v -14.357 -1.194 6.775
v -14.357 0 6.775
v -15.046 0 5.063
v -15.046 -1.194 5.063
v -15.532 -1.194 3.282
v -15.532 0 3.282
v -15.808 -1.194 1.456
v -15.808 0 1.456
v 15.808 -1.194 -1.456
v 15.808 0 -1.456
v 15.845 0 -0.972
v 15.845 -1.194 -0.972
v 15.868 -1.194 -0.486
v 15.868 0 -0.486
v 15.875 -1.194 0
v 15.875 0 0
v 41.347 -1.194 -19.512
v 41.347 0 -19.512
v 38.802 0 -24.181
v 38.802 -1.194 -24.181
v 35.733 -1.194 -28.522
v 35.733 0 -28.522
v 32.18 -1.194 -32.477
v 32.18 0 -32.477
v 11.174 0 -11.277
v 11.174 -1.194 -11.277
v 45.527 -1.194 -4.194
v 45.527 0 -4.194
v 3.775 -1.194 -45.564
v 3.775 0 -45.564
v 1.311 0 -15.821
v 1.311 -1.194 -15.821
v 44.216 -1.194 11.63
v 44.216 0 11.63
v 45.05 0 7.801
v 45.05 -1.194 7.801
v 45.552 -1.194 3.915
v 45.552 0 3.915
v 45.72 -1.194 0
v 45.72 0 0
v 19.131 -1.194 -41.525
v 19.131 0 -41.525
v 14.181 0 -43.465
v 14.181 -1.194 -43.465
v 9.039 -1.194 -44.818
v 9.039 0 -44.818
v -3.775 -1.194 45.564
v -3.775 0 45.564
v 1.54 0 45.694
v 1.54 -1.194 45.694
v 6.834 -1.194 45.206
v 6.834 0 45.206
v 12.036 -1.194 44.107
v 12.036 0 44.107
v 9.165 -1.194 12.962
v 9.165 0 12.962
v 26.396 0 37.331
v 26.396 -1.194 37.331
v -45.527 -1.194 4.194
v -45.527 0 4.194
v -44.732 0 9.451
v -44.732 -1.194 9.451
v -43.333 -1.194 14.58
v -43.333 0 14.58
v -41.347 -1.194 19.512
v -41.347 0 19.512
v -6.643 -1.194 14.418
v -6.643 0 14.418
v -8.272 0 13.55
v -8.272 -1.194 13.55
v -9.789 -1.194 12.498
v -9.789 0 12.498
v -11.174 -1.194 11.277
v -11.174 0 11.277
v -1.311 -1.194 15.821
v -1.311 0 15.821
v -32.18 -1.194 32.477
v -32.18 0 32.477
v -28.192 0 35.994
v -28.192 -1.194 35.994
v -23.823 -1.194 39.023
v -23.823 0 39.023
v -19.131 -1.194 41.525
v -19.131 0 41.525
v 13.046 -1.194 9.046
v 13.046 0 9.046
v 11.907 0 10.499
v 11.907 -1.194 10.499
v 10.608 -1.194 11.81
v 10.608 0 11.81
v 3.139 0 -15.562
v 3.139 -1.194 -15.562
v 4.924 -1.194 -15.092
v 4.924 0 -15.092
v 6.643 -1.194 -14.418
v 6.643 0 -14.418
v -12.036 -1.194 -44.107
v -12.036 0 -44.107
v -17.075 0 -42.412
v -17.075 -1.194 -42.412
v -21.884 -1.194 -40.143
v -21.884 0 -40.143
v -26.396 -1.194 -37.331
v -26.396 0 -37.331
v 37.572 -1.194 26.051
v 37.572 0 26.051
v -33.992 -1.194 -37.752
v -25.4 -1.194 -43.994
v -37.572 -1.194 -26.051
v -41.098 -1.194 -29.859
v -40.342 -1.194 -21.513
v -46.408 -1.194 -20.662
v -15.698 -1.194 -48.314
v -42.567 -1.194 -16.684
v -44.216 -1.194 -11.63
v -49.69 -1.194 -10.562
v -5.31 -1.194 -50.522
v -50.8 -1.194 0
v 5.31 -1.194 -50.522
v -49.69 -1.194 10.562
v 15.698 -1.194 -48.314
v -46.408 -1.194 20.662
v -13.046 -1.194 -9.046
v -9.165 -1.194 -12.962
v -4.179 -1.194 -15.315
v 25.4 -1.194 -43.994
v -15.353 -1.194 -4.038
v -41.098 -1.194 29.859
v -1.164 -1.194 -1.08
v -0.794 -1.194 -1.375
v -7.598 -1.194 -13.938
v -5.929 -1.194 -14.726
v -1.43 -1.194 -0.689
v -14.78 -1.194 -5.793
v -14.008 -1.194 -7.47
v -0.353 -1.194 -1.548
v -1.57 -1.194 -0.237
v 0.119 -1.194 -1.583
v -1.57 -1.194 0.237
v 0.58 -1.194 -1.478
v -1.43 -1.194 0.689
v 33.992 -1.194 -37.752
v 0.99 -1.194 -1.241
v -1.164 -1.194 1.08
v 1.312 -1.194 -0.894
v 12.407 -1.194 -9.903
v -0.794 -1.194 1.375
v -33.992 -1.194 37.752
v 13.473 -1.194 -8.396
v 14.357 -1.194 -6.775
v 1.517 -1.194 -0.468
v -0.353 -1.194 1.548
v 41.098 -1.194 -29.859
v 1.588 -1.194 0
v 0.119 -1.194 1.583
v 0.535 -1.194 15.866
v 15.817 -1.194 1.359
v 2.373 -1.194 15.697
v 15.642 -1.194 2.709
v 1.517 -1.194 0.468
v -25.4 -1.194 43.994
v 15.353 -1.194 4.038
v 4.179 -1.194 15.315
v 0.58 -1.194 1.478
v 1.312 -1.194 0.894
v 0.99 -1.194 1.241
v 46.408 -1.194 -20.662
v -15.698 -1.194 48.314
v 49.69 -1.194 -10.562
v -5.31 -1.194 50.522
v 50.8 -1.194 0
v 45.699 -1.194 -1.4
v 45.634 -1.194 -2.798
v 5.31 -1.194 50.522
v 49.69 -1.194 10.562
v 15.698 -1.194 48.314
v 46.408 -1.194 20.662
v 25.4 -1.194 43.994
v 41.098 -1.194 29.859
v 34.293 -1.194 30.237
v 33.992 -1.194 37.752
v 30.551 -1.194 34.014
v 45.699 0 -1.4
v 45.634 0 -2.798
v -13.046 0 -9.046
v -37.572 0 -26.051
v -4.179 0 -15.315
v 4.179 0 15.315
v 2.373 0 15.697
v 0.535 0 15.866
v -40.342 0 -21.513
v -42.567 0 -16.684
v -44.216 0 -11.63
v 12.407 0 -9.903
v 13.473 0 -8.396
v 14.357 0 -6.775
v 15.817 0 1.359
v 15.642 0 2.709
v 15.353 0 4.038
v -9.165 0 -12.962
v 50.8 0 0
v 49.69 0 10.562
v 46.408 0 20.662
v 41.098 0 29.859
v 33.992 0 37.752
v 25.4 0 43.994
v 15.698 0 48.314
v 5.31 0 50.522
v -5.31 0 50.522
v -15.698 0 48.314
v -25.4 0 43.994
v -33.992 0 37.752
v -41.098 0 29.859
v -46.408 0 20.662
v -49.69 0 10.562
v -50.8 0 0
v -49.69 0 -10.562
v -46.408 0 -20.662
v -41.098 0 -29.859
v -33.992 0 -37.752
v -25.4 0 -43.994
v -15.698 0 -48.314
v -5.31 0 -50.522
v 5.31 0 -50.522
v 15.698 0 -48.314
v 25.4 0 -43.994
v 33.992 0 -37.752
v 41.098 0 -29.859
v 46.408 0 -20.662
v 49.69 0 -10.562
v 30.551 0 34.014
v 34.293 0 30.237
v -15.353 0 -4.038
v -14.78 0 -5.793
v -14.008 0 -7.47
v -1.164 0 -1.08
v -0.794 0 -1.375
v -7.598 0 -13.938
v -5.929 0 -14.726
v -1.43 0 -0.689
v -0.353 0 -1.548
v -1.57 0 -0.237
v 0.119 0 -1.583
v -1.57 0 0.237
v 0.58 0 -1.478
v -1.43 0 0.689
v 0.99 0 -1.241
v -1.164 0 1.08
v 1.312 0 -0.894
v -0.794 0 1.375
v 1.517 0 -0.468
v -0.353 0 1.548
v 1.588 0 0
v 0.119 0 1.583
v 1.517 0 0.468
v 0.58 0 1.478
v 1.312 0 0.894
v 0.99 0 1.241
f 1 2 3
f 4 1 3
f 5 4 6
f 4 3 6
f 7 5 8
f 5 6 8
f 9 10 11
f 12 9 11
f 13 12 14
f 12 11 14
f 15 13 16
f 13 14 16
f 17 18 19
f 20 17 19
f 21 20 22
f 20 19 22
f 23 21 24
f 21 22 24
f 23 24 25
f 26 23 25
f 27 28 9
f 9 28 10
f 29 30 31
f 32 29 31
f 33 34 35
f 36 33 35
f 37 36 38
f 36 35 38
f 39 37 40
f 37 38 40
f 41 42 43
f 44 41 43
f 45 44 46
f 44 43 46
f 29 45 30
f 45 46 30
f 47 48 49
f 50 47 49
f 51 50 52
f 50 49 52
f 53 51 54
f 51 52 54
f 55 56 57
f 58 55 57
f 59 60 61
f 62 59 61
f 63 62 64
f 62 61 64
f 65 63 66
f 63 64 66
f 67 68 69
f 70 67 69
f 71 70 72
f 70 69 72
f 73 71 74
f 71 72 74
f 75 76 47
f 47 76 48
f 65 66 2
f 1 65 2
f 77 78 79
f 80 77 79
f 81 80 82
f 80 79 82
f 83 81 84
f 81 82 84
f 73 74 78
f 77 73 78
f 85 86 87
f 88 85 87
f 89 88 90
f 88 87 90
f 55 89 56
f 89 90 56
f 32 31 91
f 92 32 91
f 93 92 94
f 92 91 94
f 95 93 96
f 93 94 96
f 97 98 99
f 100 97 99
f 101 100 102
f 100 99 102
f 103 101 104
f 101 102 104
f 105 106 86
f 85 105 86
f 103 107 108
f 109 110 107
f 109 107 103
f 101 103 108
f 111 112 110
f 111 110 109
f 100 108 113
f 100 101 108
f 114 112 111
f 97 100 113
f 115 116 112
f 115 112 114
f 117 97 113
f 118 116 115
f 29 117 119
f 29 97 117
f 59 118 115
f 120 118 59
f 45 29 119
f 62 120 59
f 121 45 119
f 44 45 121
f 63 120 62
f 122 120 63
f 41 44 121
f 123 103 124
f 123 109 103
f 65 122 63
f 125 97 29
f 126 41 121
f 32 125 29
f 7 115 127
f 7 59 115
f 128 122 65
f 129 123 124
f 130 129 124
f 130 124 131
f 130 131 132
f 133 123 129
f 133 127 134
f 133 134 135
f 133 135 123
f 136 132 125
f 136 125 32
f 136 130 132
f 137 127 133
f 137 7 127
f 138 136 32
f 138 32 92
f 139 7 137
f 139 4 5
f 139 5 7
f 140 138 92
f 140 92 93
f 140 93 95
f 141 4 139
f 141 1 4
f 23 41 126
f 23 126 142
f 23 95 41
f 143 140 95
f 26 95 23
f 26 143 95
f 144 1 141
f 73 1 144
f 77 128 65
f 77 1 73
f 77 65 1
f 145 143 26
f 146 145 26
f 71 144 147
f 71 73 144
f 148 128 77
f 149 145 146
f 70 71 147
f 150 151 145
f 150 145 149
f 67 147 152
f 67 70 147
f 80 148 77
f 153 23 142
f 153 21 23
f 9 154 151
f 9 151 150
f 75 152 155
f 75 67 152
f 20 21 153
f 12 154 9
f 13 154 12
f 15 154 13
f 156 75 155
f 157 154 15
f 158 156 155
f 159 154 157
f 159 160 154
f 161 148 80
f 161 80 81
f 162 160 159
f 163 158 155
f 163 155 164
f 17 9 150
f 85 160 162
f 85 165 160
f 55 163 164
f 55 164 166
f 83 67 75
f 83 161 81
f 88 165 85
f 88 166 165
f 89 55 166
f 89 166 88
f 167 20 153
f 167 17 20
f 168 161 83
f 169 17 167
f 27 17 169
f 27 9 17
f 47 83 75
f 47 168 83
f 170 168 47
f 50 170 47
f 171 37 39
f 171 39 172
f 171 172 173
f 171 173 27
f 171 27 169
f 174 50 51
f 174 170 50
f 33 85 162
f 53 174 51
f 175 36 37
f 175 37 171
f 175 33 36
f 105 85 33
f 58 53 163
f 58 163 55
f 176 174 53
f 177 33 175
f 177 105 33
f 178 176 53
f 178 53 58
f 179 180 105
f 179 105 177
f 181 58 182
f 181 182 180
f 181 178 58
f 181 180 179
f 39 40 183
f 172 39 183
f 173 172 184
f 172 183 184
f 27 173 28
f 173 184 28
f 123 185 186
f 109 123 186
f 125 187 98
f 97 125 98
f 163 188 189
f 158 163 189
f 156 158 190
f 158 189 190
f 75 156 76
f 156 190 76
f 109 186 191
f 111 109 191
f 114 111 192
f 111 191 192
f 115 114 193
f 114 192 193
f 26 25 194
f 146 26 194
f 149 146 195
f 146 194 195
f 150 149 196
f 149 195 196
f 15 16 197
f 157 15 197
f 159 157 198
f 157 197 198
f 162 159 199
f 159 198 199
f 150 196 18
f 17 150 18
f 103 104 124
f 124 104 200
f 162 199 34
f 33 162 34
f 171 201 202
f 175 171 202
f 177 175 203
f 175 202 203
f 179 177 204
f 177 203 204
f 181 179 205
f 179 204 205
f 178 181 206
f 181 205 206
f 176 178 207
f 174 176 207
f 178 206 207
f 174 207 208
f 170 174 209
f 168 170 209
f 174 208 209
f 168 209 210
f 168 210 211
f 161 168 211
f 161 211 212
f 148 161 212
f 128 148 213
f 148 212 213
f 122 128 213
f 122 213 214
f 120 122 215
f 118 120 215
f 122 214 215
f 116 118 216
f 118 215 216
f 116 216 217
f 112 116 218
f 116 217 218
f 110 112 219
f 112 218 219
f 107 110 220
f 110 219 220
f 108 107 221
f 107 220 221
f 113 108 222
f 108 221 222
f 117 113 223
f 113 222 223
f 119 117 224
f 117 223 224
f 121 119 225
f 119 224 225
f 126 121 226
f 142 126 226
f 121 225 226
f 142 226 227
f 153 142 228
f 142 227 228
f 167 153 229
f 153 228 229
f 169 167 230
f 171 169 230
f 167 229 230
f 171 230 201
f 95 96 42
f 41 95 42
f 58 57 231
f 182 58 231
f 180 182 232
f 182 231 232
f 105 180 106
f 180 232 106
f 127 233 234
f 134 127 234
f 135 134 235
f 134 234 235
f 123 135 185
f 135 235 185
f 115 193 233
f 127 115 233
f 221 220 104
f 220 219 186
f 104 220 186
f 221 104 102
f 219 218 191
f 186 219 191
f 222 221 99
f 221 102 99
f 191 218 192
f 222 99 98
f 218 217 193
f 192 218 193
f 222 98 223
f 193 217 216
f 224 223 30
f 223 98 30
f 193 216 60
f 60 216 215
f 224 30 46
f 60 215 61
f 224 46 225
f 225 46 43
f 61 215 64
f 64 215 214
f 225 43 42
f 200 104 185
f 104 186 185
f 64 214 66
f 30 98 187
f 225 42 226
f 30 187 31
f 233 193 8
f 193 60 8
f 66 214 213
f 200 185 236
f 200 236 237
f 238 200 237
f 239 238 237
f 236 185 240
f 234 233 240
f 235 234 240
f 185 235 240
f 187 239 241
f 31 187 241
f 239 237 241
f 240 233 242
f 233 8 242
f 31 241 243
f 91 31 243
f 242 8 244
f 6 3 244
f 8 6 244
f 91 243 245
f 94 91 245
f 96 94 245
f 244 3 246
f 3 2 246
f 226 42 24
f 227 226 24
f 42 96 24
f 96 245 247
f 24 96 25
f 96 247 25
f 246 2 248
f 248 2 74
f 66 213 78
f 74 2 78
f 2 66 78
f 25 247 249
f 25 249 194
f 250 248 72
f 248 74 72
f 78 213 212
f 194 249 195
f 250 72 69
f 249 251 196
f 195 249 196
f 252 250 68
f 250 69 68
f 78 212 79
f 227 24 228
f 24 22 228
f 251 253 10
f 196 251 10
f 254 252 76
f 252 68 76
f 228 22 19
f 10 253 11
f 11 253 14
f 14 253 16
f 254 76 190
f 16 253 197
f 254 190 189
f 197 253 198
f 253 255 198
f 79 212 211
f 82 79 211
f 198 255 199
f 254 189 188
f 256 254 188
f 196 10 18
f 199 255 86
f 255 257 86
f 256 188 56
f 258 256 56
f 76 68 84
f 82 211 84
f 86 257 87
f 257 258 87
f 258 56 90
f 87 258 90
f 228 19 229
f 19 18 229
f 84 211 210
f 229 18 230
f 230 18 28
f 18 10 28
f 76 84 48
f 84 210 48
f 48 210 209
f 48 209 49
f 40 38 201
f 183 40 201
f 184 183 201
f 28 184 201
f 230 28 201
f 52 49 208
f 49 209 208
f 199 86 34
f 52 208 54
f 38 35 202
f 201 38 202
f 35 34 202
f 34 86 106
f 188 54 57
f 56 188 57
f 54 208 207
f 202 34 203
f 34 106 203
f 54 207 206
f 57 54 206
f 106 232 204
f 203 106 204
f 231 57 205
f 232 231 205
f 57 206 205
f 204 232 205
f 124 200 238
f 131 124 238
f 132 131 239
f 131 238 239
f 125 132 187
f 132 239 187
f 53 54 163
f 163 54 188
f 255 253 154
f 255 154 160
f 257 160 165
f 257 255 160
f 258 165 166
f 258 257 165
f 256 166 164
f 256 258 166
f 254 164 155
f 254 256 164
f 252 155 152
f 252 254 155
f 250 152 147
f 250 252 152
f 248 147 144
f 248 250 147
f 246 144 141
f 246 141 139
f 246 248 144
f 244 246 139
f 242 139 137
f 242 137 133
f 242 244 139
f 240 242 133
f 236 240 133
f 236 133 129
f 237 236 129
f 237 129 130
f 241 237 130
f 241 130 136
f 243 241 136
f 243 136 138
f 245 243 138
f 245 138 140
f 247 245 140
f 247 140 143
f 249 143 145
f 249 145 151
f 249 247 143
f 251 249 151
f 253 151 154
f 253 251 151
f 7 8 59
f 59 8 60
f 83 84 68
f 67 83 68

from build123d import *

# Parameters (mm, degrees)
F0_R     = 50.8
F0_R_2   = 1.5875
F1_DEPTH = 1.1938


with BuildPart() as f1:
    # F0 (on Front) → F1 (new body)
    with BuildSketch(Plane.XZ):
        Circle(F0_R)
        with BuildLine():
            ThreePointArc((44.21609, 11.629953), (45.342464, 5.863394), (45.72, 0))
            ThreePointArc((45.72, 0), (45.671777, -2.09932), (45.527211, -4.194212))
            ThreePointArc((45.527211, -4.194212), (44.107234, -12.03621), (41.34708, -19.512494))
            ThreePointArc((41.34708, -19.512494), (37.330616, -26.3959), (32.17988, -32.47728))
            ThreePointArc((32.17988, -32.47728), (26.051375, -37.571855), (19.131311, -41.524828))
            ThreePointArc((19.131311, -41.524828), (11.629953, -44.21609), (3.775225, -45.563868))
            ThreePointArc((3.775225, -45.563868), (-4.194212, -45.527211), (-12.03621, -44.107234))
            ThreePointArc((-12.03621, -44.107234), (-19.512494, -41.34708), (-26.3959, -37.330616))
            ThreePointArc((-26.3959, -37.330616), (-32.47728, -32.17988), (-37.571855, -26.051375))
            ThreePointArc((-37.571855, -26.051375), (-41.524828, -19.131311), (-44.21609, -11.629953))
            ThreePointArc((-44.21609, -11.629953), (-45.563868, -3.775225), (-45.527211, 4.194212))
            ThreePointArc((-45.527211, 4.194212), (-44.107234, 12.03621), (-41.34708, 19.512494))
            ThreePointArc((-41.34708, 19.512494), (-37.330616, 26.3959), (-32.17988, 32.47728))
            ThreePointArc((-32.17988, 32.47728), (-26.051375, 37.571855), (-19.131311, 41.524828))
            ThreePointArc((-19.131311, 41.524828), (-11.629953, 44.21609), (-3.775225, 45.563868))
            ThreePointArc((-3.775225, 45.563868), (4.194212, 45.527211), (12.03621, 44.107234))
            ThreePointArc((12.03621, 44.107234), (19.512494, 41.34708), (26.3959, 37.330616))
            ThreePointArc((26.3959, 37.330616), (32.47728, 32.17988), (37.571855, 26.051375))
            ThreePointArc((37.571855, 26.051375), (41.524828, 19.131311), (44.21609, 11.629953))
        make_face(mode=Mode.SUBTRACT)
        with BuildLine():
            Line((-15.80806, 1.456324), (-45.527211, 4.194212))
            ThreePointArc((-45.527211, 4.194212), (-45.563868, -3.775225), (-44.21609, -11.629953))
            Line((-44.21609, -11.629953), (-15.352809, -4.038178))
            ThreePointArc((-15.352809, -4.038178), (-15.820788, -1.310842), (-15.80806, 1.456324))
        make_face()
        with BuildLine():
            Line((-11.173569, 11.276833), (-32.17988, 32.47728))
            ThreePointArc((-32.17988, 32.47728), (-37.330616, 26.3959), (-41.34708, 19.512494))
            Line((-41.34708, 19.512494), (-14.356625, 6.775171))
            ThreePointArc((-14.356625, 6.775171), (-12.962019, 9.165243), (-11.173569, 11.276833))
        make_face()
        with BuildLine():
            Line((-1.310842, 15.820788), (-3.775225, 45.563868))
            ThreePointArc((-3.775225, 45.563868), (-11.629953, 44.21609), (-19.131311, 41.524828))
            Line((-19.131311, 41.524828), (-6.642816, 14.418343))
            ThreePointArc((-6.642816, 14.418343), (-4.038178, 15.352809), (-1.310842, 15.820788))
        make_face()
        with BuildLine():
            Line((9.165243, 12.962019), (26.3959, 37.330616))
            ThreePointArc((26.3959, 37.330616), (19.512494, 41.34708), (12.03621, 44.107234))
            Line((12.03621, 44.107234), (4.17924, 15.315012))
            ThreePointArc((4.17924, 15.315012), (6.775171, 14.356625), (9.165243, 12.962019))
        make_face()
        with BuildLine():
            Line((15.352809, 4.038178), (44.21609, 11.629953))
            ThreePointArc((44.21609, 11.629953), (41.524828, 19.131311), (37.571855, 26.051375))
            Line((37.571855, 26.051375), (13.045783, 9.045616))
            ThreePointArc((13.045783, 9.045616), (14.418343, 6.642816), (15.352809, 4.038178))
        make_face()
        with BuildLine():
            ThreePointArc((41.34708, -19.512494), (44.107234, -12.03621), (45.527211, -4.194212))
            Line((45.527211, -4.194212), (15.80806, -1.456324))
            ThreePointArc((15.80806, -1.456324), (15.315012, -4.17924), (14.356625, -6.775171))
            Line((14.356625, -6.775171), (41.34708, -19.512494))
        make_face()
        with BuildLine():
            ThreePointArc((19.131311, -41.524828), (26.051375, -37.571855), (32.17988, -32.47728))
            Line((32.17988, -32.47728), (11.173569, -11.276833))
            ThreePointArc((11.173569, -11.276833), (9.045616, -13.045783), (6.642816, -14.418343))
            Line((6.642816, -14.418343), (19.131311, -41.524828))
        make_face()
        with BuildLine():
            ThreePointArc((-12.03621, -44.107234), (-4.194212, -45.527211), (3.775225, -45.563868))
            Line((3.775225, -45.563868), (1.310842, -15.820788))
            ThreePointArc((1.310842, -15.820788), (-1.456324, -15.80806), (-4.17924, -15.315012))
            Line((-4.17924, -15.315012), (-12.03621, -44.107234))
        make_face()
        with BuildLine():
            ThreePointArc((-37.571855, -26.051375), (-32.47728, -32.17988), (-26.3959, -37.330616))
            Line((-26.3959, -37.330616), (-9.165243, -12.962019))
            ThreePointArc((-9.165243, -12.962019), (-11.276833, -11.173569), (-13.045783, -9.045616))
            Line((-13.045783, -9.045616), (-37.571855, -26.051375))
        make_face()
        with BuildLine():
            ThreePointArc((15.875, 0), (15.743911, 2.035901), (15.352809, 4.038178))
            ThreePointArc((15.352809, 4.038178), (14.418343, 6.642816), (13.045783, 9.045616))
            ThreePointArc((13.045783, 9.045616), (11.276833, 11.173569), (9.165243, 12.962019))
            ThreePointArc((9.165243, 12.962019), (6.775171, 14.356625), (4.17924, 15.315012))
            ThreePointArc((4.17924, 15.315012), (1.456324, 15.80806), (-1.310842, 15.820788))
            ThreePointArc((-1.310842, 15.820788), (-4.038178, 15.352809), (-6.642816, 14.418343))
            ThreePointArc((-6.642816, 14.418343), (-9.045616, 13.045783), (-11.173569, 11.276833))
            ThreePointArc((-11.173569, 11.276833), (-12.962019, 9.165243), (-14.356625, 6.775171))
            ThreePointArc((-14.356625, 6.775171), (-15.315012, 4.17924), (-15.80806, 1.456324))
            ThreePointArc((-15.80806, 1.456324), (-15.820788, -1.310842), (-15.352809, -4.038178))
            ThreePointArc((-15.352809, -4.038178), (-14.418343, -6.642816), (-13.045783, -9.045616))
            ThreePointArc((-13.045783, -9.045616), (-11.276833, -11.173569), (-9.165243, -12.962019))
            ThreePointArc((-9.165243, -12.962019), (-6.775171, -14.356625), (-4.17924, -15.315012))
            ThreePointArc((-4.17924, -15.315012), (-1.456324, -15.80806), (1.310842, -15.820788))
            ThreePointArc((1.310842, -15.820788), (4.038178, -15.352809), (6.642816, -14.418343))
            ThreePointArc((6.642816, -14.418343), (9.045616, -13.045783), (11.173569, -11.276833))
            ThreePointArc((11.173569, -11.276833), (12.962019, -9.165243), (14.356625, -6.775171))
            ThreePointArc((14.356625, -6.775171), (15.315012, -4.17924), (15.80806, -1.456324))
            ThreePointArc((15.80806, -1.456324), (15.858256, -0.728931), (15.875, 0))
        make_face()
        Circle(F0_R_2, mode=Mode.SUBTRACT)
    extrude(amount=F1_DEPTH)


solid = f1.part
